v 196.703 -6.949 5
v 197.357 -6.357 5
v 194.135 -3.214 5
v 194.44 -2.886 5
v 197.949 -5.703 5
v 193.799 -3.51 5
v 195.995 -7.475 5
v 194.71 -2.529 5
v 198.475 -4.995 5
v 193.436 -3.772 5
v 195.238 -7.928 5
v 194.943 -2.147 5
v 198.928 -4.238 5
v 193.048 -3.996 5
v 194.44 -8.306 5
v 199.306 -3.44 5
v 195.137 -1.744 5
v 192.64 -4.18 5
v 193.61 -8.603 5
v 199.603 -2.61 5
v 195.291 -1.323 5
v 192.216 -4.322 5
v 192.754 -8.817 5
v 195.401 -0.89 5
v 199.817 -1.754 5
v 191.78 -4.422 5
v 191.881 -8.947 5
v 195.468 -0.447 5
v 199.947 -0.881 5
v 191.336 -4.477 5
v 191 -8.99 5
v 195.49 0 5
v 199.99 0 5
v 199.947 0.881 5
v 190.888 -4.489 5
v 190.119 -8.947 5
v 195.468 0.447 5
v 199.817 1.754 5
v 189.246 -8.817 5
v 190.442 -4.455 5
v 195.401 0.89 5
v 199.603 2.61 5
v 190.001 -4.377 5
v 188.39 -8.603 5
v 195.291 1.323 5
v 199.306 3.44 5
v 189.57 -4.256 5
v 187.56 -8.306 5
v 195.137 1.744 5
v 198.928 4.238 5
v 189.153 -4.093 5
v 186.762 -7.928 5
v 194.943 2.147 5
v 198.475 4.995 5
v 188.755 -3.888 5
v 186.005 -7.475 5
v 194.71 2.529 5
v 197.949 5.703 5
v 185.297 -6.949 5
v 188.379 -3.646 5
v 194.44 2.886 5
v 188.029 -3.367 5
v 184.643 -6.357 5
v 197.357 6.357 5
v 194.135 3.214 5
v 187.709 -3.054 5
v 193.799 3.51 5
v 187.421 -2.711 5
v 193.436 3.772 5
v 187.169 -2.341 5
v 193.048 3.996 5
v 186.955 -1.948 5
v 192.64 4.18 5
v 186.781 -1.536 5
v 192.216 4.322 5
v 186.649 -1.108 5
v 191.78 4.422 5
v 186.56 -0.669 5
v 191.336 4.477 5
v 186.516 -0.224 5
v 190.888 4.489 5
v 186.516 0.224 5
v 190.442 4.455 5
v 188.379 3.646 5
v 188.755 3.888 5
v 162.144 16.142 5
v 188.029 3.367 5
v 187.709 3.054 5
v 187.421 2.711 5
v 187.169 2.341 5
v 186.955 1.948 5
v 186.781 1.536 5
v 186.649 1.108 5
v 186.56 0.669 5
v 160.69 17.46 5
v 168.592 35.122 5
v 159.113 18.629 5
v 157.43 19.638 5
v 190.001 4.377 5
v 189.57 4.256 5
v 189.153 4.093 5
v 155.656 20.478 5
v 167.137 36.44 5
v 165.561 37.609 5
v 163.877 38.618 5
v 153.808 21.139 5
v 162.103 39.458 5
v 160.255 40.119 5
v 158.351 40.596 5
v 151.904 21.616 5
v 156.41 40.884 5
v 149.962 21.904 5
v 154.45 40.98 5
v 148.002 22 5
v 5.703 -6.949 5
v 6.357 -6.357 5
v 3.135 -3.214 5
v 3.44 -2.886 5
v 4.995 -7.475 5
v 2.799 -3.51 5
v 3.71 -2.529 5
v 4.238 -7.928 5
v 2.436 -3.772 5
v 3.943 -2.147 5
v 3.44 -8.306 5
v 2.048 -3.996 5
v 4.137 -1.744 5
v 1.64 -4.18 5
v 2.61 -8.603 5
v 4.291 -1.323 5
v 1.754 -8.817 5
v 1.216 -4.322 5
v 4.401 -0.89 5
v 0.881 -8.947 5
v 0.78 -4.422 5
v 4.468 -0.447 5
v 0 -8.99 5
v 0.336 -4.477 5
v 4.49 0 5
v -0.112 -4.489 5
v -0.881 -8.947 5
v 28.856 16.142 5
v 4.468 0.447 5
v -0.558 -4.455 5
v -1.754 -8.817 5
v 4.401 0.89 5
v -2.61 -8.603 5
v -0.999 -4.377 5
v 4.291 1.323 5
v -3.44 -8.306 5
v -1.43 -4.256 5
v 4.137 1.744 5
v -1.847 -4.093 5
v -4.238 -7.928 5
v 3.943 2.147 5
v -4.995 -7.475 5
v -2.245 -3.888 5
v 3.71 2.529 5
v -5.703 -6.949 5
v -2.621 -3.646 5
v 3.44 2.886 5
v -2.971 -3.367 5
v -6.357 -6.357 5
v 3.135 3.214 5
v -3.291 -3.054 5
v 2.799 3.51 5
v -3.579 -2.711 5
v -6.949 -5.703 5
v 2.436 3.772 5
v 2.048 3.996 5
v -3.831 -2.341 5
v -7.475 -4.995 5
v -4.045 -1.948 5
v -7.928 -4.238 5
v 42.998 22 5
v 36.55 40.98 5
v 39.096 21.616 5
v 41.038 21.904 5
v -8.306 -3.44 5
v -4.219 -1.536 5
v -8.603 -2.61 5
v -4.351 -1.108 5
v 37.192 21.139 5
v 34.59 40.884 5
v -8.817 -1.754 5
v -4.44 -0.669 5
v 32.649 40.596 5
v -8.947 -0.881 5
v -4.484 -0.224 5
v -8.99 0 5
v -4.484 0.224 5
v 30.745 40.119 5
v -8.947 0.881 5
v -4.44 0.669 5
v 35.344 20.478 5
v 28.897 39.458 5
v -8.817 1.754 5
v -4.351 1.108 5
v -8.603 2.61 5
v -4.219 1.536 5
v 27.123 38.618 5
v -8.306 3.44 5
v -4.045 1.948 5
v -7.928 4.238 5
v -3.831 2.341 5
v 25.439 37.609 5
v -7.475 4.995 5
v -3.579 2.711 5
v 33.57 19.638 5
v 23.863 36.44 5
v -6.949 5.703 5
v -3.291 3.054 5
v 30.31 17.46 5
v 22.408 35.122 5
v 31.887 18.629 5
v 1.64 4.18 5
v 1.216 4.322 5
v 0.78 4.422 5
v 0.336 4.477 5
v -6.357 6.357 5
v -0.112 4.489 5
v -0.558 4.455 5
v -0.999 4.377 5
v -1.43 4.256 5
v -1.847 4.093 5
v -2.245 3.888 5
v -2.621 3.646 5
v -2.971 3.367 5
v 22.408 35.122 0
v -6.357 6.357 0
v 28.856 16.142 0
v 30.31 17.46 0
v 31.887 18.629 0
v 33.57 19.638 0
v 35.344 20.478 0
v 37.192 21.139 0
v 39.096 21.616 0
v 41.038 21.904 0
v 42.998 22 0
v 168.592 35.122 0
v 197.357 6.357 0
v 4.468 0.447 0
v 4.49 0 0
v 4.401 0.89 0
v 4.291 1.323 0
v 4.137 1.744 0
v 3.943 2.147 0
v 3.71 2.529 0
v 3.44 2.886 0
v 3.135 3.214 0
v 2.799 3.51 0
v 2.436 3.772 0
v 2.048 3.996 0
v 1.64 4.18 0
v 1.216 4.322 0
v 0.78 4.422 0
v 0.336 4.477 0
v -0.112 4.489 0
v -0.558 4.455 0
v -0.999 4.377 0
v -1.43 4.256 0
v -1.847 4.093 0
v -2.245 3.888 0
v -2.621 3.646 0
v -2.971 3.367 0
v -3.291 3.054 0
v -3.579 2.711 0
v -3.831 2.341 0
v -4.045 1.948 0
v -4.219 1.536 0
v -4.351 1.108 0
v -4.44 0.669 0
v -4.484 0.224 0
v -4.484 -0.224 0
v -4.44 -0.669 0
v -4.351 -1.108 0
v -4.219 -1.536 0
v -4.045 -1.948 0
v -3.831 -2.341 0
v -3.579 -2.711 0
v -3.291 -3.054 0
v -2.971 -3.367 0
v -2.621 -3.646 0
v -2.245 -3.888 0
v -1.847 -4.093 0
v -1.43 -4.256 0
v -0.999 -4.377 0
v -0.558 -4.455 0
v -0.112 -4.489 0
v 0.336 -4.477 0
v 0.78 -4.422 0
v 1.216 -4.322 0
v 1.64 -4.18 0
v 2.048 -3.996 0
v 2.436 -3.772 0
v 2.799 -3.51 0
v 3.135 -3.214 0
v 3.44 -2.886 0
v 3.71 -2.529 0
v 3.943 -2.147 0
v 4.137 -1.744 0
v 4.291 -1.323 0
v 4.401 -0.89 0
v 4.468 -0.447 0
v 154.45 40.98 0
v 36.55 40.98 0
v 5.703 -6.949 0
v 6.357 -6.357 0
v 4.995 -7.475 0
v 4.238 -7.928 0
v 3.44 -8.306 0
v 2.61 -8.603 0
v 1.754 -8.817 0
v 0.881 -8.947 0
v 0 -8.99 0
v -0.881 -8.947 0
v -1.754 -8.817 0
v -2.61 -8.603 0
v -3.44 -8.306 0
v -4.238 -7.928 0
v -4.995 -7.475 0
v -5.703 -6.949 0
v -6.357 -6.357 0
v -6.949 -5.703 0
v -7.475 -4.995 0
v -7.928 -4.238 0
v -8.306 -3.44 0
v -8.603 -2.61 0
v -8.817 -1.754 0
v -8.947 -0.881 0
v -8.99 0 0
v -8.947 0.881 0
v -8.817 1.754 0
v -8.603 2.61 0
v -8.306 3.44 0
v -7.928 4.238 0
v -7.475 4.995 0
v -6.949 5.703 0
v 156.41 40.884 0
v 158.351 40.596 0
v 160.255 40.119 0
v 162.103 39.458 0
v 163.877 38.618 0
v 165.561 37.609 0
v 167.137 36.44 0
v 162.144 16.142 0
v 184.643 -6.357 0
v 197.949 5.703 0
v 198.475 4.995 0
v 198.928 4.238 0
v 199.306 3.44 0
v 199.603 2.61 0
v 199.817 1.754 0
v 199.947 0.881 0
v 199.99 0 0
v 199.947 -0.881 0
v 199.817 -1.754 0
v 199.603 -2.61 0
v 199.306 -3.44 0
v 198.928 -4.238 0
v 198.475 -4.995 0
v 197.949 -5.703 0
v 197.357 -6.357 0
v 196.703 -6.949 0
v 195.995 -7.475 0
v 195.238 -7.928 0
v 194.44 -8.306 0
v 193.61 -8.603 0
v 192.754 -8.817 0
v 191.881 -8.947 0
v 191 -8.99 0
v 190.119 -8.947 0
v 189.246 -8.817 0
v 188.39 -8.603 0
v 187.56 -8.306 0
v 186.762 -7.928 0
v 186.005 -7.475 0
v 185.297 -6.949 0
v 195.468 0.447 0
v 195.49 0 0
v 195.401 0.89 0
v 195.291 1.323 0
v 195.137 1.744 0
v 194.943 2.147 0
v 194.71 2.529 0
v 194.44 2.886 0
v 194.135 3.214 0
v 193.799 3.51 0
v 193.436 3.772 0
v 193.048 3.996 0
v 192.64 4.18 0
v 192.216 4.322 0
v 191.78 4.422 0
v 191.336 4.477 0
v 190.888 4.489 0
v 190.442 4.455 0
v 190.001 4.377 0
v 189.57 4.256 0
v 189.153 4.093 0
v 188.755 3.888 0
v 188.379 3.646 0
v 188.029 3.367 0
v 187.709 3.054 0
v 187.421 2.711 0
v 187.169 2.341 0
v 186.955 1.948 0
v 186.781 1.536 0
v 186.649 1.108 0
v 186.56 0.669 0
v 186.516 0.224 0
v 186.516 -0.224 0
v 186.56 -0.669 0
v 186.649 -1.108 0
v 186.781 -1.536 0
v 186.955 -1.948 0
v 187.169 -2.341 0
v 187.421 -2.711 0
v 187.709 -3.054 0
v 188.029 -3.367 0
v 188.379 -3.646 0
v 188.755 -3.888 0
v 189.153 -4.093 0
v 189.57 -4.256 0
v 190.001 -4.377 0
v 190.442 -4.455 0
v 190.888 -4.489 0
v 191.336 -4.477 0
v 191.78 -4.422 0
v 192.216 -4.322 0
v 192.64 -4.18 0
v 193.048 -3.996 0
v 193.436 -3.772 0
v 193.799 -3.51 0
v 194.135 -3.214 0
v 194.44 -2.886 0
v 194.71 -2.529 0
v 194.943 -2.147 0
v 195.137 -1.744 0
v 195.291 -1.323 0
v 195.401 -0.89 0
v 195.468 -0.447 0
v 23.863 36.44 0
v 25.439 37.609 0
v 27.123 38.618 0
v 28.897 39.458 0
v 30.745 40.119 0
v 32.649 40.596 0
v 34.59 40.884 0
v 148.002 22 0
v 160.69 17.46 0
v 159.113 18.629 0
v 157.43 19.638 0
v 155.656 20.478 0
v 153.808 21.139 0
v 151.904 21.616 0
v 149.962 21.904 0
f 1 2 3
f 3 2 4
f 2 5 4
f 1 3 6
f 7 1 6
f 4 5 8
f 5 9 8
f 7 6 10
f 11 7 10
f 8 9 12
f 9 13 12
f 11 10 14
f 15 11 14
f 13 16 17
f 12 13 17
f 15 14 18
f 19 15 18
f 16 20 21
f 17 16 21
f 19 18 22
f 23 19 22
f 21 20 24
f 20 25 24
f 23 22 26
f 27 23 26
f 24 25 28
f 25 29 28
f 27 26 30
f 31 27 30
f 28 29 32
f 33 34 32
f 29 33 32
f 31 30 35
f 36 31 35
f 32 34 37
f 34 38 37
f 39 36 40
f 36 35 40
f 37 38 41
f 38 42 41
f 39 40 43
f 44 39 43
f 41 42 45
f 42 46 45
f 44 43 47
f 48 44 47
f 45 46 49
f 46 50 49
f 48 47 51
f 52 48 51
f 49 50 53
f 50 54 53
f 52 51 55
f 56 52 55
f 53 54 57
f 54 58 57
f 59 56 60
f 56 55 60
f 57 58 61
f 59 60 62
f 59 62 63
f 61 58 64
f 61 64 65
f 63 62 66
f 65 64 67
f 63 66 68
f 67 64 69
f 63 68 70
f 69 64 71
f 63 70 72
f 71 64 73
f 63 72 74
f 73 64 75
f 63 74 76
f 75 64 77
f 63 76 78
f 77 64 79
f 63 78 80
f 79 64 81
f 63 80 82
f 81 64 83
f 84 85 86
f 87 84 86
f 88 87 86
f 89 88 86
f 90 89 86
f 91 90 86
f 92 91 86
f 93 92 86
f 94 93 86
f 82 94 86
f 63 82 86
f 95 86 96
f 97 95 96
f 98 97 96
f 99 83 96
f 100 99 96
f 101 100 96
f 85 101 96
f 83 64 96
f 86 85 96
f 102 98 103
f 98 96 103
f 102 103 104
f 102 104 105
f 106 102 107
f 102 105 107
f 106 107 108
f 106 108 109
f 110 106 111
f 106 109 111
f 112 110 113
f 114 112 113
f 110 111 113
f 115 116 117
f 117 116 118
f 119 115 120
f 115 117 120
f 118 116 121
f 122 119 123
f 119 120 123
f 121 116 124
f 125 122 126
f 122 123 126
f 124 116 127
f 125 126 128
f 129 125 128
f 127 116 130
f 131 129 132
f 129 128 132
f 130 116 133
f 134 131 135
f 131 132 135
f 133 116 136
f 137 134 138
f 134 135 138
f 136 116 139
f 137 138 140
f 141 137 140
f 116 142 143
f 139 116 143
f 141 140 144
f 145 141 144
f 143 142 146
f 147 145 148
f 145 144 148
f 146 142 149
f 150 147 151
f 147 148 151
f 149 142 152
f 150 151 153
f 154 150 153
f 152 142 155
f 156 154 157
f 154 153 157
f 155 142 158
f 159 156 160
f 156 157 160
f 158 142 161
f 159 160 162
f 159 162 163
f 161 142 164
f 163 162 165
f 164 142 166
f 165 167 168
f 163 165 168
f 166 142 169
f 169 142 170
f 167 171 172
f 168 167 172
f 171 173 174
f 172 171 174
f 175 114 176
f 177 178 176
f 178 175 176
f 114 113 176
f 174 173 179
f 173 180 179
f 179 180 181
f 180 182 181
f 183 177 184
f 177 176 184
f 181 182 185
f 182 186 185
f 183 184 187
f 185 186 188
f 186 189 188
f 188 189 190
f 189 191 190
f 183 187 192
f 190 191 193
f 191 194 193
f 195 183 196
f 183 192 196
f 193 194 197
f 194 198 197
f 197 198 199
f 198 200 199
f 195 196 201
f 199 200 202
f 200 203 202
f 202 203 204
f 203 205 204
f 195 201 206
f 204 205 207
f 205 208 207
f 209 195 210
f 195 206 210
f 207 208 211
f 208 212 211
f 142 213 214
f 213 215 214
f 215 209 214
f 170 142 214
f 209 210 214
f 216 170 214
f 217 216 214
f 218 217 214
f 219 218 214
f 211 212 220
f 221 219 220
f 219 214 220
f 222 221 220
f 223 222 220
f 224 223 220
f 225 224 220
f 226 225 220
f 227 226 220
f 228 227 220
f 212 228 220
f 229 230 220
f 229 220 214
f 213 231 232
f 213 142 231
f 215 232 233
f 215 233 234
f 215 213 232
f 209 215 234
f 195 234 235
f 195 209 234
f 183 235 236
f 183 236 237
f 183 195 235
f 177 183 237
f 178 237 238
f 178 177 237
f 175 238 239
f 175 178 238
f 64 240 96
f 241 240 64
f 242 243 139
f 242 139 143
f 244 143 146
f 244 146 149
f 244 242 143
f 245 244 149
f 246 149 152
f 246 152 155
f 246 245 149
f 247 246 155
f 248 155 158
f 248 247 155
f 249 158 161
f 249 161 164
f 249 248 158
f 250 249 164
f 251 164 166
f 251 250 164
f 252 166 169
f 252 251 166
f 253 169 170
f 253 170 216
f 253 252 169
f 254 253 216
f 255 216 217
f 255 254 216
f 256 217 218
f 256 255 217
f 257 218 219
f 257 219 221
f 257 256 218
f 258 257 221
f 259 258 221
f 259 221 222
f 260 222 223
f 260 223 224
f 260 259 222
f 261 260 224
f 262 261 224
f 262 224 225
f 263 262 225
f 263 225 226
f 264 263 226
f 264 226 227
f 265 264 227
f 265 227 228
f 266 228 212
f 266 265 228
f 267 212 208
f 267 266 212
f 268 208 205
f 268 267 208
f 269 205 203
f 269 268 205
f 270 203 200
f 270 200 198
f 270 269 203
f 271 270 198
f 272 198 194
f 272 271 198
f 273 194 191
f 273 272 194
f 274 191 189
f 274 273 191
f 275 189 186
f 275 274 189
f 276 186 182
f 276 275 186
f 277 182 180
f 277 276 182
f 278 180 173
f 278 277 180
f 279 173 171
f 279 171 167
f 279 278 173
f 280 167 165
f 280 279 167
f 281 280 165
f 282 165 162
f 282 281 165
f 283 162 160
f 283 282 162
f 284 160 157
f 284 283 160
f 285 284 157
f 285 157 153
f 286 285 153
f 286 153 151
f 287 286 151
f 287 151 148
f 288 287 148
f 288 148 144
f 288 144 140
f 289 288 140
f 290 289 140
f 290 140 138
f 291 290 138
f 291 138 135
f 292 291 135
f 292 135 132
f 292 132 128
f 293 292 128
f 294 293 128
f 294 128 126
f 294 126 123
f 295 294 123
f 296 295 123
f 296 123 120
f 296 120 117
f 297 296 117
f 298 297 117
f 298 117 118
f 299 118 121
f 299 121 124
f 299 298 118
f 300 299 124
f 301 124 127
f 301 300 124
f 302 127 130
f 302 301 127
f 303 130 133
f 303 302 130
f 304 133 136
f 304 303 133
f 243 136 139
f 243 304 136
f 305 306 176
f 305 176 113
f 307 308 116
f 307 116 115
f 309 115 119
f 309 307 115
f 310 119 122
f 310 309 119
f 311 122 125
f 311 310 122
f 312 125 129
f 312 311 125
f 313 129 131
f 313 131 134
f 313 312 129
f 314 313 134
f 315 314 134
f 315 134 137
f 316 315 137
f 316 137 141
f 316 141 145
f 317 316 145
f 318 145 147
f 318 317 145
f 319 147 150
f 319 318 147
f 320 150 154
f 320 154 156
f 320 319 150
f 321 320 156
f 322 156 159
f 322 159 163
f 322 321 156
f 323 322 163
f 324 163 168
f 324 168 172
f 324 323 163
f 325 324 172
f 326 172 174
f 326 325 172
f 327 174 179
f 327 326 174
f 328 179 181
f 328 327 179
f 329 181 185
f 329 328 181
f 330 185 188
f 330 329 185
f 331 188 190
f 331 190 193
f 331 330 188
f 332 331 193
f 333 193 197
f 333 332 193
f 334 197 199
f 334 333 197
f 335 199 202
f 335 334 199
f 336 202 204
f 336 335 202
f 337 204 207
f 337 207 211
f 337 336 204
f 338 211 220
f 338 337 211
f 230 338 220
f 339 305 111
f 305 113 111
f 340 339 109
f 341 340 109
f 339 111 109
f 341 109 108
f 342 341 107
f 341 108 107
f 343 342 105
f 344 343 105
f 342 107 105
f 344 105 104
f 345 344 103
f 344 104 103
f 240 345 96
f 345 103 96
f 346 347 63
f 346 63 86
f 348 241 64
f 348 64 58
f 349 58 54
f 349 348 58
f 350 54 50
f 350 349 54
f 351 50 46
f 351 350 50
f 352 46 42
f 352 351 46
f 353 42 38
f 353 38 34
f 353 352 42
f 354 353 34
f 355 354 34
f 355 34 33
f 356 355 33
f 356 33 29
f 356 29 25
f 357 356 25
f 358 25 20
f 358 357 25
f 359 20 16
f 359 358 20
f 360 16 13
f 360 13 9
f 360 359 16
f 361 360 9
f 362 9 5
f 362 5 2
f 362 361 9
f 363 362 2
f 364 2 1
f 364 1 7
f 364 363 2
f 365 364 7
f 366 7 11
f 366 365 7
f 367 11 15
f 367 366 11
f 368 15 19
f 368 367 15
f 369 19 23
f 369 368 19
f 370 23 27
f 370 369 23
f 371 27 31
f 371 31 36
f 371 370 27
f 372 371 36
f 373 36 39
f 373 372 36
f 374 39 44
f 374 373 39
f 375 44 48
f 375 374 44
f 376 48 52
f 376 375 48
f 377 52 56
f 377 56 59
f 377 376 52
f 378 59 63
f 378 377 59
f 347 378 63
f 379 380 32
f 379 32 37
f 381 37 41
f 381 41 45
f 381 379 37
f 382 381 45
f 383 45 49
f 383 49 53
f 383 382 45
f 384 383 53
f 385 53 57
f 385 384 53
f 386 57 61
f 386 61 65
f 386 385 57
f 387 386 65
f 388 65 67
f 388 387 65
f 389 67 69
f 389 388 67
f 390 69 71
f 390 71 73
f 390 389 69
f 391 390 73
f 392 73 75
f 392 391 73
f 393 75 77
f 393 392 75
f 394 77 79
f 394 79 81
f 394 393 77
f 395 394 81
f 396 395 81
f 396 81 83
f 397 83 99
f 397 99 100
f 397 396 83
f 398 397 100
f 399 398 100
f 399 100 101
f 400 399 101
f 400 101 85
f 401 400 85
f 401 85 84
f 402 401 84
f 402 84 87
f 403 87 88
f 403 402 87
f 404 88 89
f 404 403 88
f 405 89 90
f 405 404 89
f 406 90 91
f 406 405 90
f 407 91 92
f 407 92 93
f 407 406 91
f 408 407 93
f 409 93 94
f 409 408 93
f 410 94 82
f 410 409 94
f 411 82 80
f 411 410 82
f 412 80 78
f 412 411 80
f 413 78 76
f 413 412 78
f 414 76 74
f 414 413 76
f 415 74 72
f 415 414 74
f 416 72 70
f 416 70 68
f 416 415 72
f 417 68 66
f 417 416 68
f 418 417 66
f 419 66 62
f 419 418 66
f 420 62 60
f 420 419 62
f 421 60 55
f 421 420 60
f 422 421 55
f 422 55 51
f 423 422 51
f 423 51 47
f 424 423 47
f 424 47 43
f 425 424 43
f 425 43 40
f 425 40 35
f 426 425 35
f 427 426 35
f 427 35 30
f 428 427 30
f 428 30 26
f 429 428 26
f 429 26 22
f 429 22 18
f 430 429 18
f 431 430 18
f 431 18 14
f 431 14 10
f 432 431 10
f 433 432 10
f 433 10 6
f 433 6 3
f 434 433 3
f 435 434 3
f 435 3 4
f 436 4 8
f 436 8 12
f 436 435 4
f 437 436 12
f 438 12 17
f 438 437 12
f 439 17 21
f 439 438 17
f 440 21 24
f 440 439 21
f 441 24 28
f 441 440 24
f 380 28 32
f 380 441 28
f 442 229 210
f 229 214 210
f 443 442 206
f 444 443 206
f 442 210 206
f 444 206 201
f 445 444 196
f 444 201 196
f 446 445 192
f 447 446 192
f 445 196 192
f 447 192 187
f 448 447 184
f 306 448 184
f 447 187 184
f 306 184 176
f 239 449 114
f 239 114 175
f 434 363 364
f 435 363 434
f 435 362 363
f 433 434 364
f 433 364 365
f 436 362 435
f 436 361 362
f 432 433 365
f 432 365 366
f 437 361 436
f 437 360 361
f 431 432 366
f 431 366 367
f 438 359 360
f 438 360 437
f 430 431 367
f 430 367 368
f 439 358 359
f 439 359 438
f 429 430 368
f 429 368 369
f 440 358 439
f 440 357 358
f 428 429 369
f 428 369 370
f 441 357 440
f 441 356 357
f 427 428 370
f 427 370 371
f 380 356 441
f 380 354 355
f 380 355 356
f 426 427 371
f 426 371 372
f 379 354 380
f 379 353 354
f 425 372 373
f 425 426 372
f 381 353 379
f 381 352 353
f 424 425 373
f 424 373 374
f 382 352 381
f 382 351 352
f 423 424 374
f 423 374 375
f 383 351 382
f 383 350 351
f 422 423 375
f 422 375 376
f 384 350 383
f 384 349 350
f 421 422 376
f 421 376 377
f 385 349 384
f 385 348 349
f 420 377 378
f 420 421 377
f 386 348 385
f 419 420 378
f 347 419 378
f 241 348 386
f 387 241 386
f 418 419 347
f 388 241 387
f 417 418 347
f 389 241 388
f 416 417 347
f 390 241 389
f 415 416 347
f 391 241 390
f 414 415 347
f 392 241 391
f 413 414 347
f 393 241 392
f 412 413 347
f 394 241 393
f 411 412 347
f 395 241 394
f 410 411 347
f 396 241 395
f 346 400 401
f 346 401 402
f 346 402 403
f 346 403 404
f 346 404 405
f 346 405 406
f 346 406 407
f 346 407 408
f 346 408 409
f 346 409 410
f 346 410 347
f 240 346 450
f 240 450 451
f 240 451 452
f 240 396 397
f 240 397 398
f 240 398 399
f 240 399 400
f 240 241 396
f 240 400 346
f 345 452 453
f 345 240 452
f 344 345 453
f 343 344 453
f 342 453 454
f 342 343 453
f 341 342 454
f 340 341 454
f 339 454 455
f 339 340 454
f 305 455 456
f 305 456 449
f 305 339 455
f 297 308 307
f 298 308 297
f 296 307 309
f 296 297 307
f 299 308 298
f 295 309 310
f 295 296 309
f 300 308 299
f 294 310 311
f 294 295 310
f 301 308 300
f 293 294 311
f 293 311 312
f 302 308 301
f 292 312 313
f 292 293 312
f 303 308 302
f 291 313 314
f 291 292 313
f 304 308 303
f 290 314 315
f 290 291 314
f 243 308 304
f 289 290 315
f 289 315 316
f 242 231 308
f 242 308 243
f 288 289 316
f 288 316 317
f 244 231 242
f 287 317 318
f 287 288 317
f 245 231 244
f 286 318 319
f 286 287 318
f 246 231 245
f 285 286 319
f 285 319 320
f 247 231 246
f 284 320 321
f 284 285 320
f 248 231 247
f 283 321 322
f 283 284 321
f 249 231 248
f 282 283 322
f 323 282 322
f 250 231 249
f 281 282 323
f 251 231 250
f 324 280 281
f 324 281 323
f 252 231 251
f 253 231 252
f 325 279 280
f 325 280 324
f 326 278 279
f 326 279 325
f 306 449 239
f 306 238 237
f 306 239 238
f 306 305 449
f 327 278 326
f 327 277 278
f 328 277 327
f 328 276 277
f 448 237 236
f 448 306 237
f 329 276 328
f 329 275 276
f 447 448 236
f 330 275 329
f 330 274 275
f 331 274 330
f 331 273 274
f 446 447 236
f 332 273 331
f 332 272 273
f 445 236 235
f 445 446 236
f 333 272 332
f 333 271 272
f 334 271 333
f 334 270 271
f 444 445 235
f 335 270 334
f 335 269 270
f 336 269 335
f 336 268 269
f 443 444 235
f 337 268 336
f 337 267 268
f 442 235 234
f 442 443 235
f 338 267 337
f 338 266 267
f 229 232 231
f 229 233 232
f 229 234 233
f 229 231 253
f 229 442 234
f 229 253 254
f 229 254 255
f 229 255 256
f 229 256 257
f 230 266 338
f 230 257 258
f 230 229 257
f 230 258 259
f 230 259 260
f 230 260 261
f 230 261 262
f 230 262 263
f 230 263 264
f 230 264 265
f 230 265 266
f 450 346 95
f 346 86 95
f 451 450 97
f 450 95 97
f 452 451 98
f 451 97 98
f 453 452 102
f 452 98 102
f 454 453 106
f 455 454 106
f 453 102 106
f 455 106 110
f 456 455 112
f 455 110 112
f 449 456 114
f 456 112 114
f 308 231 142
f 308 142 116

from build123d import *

# Parameters (mm, degrees)
SKETCH1_R           = 4.49
BOSS_EXTRUDE1_DEPTH = 5
FILLET1_R           = 20
FILLET2_R           = 20
FILLET3_R           = 20
FILLET4_R           = 20


with BuildPart() as part:
    # Sketch1 → Boss-Extrude1 (new body)
    with BuildSketch(Plane.XY):
        with BuildLine():
            Line((-6.356889963, 6.356889963), (28.266220074, 40.98))
            Line((28.266220074, 40.98), (162.733779926, 40.98))
            Line((162.733779926, 40.98), (197.356889963, 6.356889963))
            ThreePointArc((197.356889963, 6.356889963), (197.356889963, -6.356889963), (184.643110037, -6.356889963))
            Line((184.643110037, -6.356889963), (156.286220074, 22))
            Line((156.286220074, 22), (34.713779926, 22))
            Line((34.713779926, 22), (6.356889963, -6.356889963))
            ThreePointArc((6.356889963, -6.356889963), (-6.356889963, -6.356889963), (-6.356889963, 6.356889963))
        make_face()
        Circle(SKETCH1_R, mode=Mode.SUBTRACT)
        with Locations((191, 0)):
            Circle(SKETCH1_R, mode=Mode.SUBTRACT)
    extrude(amount=BOSS_EXTRUDE1_DEPTH)

    # Fillet1
    fillet1_edges = [part.edges().sort_by_distance(p)[0] for p in [
        (28.266220074, 40.98, 2.5),
    ]]
    fillet(fillet1_edges, radius=FILLET1_R)

    # Fillet2
    fillet2_edges = [part.edges().sort_by_distance(p)[0] for p in [
        (34.713779926, 22, 2.5),
    ]]
    fillet(fillet2_edges, radius=FILLET2_R)

    # Fillet3
    fillet3_edges = [part.edges().sort_by_distance(p)[0] for p in [
        (162.733779926, 40.98, 2.5),
    ]]
    fillet(fillet3_edges, radius=FILLET3_R)

    # Fillet4
    fillet4_edges = [part.edges().sort_by_distance(p)[0] for p in [
        (156.286220074, 22, 2.5),
    ]]
    fillet(fillet4_edges, radius=FILLET4_R)


solid = part.part
